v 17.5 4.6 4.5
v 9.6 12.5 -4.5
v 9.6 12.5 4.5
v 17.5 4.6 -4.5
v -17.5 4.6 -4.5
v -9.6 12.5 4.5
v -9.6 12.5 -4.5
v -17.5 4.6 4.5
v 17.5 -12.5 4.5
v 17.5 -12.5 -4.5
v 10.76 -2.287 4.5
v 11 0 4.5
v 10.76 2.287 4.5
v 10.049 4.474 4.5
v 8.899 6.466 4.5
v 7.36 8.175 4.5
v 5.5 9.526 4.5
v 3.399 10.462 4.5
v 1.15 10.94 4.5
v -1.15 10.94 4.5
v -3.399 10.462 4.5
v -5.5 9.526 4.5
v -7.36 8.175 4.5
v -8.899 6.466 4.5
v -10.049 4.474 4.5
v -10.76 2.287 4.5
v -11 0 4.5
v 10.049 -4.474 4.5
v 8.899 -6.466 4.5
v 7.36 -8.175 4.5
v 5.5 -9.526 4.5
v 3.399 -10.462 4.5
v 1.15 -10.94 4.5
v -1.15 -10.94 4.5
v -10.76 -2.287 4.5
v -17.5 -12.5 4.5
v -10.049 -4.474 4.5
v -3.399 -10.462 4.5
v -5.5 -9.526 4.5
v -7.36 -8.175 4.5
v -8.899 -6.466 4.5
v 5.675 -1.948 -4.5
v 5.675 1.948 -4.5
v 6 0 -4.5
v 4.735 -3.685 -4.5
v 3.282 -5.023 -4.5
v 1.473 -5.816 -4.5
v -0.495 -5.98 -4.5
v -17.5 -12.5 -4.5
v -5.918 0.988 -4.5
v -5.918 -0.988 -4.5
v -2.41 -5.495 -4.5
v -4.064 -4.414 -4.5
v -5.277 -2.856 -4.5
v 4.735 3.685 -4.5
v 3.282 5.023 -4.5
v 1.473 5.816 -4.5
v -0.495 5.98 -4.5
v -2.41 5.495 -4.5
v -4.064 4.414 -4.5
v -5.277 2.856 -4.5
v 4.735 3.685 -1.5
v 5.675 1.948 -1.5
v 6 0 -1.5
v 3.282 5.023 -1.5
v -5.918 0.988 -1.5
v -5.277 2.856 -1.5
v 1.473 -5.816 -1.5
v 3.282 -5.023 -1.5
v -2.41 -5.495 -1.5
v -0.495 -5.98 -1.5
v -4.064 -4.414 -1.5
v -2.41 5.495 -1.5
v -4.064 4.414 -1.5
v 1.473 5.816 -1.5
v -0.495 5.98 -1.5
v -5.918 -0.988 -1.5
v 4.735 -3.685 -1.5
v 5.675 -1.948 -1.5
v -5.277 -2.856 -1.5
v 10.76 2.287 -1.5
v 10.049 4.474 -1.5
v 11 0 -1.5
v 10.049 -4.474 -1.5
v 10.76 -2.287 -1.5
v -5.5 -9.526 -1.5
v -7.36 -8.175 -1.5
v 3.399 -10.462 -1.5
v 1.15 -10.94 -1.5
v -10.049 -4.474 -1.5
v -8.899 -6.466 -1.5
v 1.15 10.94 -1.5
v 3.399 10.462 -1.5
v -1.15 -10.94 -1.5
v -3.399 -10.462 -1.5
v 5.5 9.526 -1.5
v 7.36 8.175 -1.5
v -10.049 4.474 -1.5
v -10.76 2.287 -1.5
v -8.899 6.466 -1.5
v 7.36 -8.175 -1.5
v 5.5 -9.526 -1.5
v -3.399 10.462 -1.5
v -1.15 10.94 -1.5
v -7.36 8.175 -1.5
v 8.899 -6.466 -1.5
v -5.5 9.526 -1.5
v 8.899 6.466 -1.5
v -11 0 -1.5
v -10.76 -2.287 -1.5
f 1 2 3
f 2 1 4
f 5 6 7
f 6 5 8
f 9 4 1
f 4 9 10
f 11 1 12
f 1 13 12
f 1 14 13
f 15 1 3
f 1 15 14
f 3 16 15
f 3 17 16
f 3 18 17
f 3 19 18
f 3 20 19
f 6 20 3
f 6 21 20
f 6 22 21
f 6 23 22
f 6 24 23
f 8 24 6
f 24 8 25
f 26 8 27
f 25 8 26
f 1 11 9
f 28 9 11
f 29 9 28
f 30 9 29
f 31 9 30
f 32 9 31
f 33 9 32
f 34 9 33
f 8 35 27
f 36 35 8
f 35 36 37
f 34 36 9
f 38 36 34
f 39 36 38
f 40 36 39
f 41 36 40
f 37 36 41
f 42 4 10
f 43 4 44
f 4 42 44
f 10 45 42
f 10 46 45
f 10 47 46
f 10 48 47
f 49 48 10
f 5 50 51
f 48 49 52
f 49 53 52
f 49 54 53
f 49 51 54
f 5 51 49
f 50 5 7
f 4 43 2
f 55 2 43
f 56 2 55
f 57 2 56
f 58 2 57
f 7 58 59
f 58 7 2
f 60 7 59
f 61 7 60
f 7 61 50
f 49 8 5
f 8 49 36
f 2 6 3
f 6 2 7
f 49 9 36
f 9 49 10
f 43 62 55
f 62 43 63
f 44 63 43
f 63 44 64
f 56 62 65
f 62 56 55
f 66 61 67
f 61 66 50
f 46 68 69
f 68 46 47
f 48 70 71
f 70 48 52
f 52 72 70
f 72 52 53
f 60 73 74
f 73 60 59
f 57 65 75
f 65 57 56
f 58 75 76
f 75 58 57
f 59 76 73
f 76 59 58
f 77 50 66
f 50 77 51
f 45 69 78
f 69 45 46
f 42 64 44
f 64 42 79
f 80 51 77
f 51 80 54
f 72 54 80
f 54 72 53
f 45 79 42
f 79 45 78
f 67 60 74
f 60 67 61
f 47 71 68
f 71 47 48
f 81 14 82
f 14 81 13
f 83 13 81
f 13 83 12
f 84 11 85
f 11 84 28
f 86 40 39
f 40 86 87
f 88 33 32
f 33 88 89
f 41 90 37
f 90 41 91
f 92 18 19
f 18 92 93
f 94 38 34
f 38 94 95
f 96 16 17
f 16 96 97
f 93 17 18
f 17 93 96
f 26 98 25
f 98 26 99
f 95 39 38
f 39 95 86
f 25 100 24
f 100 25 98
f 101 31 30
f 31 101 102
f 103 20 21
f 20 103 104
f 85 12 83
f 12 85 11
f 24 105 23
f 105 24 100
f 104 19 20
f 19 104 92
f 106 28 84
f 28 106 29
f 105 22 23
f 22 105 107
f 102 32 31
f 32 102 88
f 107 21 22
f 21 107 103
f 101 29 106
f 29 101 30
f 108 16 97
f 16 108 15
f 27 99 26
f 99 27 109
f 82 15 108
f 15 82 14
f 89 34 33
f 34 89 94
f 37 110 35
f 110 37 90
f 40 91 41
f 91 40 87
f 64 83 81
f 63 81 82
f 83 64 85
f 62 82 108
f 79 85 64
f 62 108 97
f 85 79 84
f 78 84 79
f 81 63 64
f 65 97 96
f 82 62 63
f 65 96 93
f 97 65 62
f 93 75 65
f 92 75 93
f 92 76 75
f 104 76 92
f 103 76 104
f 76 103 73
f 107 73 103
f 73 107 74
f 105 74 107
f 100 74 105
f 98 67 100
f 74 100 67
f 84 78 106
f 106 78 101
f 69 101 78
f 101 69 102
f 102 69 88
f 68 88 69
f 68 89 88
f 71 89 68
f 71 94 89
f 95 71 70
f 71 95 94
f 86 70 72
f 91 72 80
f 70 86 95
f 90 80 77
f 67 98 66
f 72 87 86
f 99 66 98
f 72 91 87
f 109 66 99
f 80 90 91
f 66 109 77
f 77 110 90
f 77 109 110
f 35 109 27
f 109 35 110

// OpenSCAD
// file: chamferCut.scad
chamferCut(outer=false);

module chamferCut(size=[5,6,7],outer=true){
    if(outer)
    linear_extrude(size.z)polygon([[0,0],[0,-size.y],[-size.x,0]]);
    if(!outer)mirror([1,1,0])
    linear_extrude(size.z)polygon([[0,0],[0,-size.y],[-size.x,0]]);
}
// file: mirror_copy.scad
module mirror_copy(vector=[1,0,0]){
    children();
    mirror(vector) children();
}
// main file
use<mirror_copy.scad>
use<chamferCut.scad>

difference(){
    lug();
    cylinder(d=12,h=10,center=true);
    translate([0,0,-1.5])cylinder(d=22,h=7);
}

module lug(dims=[35,25,9],chamfer=[8,8]){
    difference(){
        cube(dims,center=true);
        mirror_copy([1,0,0])translate([dims.x/2+0.1,dims.y/2+0.1,-(dims.z/2+0.1)])chamferCut([chamfer.x+0.1,chamfer.y+0.1,dims.z+0.2]);
    }
}
